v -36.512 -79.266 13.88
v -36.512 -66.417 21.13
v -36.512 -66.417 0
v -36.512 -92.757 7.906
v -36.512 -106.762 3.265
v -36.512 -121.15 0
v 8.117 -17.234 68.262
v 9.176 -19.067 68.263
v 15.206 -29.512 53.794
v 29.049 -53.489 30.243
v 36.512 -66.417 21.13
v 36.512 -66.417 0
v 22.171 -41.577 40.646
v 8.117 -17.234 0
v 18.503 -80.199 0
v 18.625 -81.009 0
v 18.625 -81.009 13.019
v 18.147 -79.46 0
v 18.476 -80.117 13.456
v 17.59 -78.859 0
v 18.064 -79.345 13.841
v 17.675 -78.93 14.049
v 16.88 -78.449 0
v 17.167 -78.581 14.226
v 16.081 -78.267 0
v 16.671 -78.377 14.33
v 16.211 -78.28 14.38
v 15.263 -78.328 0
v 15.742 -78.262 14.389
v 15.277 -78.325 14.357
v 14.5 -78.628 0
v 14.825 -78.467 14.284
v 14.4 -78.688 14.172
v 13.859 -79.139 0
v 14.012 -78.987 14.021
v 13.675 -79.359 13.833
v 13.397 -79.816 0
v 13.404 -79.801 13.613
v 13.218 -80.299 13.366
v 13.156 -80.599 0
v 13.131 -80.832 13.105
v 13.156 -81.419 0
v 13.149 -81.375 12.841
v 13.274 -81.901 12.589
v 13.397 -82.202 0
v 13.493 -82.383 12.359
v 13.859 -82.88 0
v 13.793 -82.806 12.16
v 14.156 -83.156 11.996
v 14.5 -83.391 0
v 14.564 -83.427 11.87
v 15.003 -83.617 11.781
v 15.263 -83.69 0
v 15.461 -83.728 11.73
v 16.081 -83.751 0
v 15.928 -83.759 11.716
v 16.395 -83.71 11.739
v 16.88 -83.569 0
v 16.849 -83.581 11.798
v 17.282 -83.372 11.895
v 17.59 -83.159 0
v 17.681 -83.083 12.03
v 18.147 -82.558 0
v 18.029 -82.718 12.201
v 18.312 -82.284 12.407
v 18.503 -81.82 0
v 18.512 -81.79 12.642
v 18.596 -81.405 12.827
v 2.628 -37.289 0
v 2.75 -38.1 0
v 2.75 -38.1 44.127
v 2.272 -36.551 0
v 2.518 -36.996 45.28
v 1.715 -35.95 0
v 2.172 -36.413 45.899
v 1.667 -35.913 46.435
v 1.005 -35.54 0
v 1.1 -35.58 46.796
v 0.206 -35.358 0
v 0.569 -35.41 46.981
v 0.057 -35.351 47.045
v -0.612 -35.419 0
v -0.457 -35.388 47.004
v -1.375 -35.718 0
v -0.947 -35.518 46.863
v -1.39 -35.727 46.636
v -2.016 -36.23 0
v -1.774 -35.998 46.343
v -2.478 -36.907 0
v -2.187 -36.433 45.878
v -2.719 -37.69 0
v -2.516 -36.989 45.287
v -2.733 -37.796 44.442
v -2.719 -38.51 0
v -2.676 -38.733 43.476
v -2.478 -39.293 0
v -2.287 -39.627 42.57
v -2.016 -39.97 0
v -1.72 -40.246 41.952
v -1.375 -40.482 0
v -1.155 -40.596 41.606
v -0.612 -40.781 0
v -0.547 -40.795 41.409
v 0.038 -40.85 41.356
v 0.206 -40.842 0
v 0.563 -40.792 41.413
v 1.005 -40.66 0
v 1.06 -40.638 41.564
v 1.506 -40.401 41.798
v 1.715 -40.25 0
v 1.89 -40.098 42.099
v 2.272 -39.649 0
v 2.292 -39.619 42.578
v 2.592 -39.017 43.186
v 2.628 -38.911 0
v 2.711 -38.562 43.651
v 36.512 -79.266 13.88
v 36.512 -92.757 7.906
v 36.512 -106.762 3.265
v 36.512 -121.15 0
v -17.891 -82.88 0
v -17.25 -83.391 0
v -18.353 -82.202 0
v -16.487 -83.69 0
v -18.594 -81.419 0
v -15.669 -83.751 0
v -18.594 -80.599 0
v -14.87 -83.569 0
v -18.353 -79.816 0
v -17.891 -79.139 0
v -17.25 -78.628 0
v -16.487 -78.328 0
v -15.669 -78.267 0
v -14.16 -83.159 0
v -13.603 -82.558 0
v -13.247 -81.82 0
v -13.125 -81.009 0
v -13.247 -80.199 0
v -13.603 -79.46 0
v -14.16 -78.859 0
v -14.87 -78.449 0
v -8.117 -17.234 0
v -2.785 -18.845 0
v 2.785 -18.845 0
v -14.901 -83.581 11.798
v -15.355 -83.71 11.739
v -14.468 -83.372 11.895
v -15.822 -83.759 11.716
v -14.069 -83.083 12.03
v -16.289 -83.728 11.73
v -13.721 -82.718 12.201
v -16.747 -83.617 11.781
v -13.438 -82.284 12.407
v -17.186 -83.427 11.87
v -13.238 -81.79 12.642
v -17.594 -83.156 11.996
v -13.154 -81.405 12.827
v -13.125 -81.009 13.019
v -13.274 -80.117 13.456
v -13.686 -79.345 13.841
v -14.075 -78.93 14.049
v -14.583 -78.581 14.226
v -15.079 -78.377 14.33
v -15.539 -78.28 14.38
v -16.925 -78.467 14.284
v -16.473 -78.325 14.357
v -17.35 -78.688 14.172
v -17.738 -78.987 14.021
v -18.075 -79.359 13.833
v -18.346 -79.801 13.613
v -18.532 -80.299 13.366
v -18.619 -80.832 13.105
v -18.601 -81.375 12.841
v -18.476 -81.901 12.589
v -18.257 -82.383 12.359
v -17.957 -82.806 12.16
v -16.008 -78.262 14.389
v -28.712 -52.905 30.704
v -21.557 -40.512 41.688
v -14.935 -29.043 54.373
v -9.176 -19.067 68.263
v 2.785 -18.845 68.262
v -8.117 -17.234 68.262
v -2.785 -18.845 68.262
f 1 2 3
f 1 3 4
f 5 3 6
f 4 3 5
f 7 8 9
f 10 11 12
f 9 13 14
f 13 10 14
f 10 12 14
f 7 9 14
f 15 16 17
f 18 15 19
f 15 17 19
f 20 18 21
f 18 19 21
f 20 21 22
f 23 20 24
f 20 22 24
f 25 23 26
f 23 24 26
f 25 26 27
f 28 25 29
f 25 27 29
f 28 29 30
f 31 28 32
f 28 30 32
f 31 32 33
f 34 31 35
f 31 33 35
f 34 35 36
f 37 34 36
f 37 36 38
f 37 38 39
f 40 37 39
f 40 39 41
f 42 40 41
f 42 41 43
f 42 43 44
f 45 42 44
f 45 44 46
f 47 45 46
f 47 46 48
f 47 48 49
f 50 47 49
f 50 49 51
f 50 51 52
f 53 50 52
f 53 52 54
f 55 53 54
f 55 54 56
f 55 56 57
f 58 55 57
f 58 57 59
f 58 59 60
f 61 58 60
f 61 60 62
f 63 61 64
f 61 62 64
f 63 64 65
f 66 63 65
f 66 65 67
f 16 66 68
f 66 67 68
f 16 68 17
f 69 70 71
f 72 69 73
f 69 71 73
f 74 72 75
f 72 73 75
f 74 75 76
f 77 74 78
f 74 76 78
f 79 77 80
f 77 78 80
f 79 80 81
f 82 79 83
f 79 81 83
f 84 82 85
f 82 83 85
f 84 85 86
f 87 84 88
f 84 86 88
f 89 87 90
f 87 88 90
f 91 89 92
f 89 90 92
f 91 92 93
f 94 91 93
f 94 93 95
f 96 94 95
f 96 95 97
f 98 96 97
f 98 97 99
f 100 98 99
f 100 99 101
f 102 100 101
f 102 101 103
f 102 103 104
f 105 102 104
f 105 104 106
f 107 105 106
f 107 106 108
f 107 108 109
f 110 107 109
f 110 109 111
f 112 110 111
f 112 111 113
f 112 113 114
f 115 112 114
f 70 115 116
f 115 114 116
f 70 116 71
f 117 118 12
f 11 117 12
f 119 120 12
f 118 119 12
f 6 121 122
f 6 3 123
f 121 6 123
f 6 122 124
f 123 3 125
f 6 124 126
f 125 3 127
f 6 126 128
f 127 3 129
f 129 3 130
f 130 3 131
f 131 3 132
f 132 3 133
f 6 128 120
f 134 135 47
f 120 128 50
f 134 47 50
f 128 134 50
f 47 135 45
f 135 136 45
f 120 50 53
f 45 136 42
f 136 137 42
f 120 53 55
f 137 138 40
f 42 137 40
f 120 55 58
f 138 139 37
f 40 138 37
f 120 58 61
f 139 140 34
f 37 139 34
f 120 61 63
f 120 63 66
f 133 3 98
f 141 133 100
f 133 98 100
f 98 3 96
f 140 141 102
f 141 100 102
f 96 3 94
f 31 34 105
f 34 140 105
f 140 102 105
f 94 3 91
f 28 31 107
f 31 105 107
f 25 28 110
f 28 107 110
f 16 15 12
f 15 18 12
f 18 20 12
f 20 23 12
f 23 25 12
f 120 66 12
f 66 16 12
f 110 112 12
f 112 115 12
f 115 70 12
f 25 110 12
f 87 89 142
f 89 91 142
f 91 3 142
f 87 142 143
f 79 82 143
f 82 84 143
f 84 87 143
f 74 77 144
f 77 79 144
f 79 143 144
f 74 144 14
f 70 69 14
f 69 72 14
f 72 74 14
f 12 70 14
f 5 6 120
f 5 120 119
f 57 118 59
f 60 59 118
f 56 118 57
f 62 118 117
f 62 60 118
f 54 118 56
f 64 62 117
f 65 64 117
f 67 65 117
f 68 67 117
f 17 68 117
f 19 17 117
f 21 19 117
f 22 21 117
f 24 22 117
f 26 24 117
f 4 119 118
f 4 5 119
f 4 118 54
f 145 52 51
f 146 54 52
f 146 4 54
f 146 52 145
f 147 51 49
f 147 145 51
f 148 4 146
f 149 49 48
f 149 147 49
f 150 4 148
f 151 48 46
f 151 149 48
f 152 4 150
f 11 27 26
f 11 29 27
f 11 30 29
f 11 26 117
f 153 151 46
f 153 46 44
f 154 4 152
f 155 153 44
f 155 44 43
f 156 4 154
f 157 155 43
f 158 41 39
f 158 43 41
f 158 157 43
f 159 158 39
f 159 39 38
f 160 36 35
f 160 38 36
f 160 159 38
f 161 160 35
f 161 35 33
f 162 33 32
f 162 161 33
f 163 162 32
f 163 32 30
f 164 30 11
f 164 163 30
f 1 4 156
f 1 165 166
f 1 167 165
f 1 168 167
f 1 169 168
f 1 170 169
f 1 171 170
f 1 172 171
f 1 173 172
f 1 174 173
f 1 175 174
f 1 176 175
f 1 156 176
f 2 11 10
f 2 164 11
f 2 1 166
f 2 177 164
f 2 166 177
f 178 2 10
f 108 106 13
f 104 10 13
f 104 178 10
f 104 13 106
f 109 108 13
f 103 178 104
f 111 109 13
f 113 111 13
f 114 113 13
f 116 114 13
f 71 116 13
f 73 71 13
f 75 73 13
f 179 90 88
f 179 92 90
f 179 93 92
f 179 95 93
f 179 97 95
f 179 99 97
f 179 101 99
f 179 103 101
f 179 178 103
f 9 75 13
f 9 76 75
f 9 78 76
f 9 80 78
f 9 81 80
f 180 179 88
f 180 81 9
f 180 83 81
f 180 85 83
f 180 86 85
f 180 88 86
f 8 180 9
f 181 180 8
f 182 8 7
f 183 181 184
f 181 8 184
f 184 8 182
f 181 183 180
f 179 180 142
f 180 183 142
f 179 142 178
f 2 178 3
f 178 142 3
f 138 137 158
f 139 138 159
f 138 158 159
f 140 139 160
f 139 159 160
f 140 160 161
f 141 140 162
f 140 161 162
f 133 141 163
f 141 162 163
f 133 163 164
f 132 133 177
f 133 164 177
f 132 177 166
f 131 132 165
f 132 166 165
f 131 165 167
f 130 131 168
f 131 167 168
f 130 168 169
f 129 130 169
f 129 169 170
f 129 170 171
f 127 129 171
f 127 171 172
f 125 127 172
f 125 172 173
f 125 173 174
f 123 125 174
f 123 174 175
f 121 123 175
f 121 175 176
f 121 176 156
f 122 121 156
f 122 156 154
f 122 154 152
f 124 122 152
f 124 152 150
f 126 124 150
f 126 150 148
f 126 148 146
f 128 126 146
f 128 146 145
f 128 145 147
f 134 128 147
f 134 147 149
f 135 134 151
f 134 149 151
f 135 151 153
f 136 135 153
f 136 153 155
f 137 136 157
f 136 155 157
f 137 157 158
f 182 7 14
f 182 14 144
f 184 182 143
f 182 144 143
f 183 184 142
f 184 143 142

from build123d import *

# Parameters (mm, degrees)
BOSS_EXTRUDE1_DEPTH  = 76.2
CUT_EXTRUDE1_START   = -36.5125
CUT_EXTRUDE1_DEPTH   = 73.025
M5_CLEARANCE_HOLE1_D = 5.5
CUT_EXTRUDE2_REACH   = 145.772
SKETCH10_R           = 19.05


with BuildPart() as part:
    # Sketch1 → Boss-Extrude1 (new body)
    with BuildSketch(Plane.XY):
        Polygon((36.5125, -121.15027858), (36.5125, -66.416505111), (0, -3.175), (-36.5125, -66.416505111), (-36.5125, -121.15027858), align=None)
    extrude(amount=BOSS_EXTRUDE1_DEPTH)

    # Sketch2 → Cut-Extrude1 (cut)
    with BuildSketch(Plane(origin=(0, 0, 0), x_dir=(0, 0, -1), z_dir=(1, 0, 0)).offset(CUT_EXTRUDE1_START)):
        with BuildLine():
            Line((-76.2, -121.15027858), (0, -121.15027858))
            ThreePointArc((0, -121.15027858), (-23.393988511, -62.928903921), (-68.2625, -19.067487592))
            Line((-68.2625, -19.067487592), (-68.2625, -3.175))
            Line((-68.2625, -3.175), (-76.2, -3.175))
            Line((-76.2, -3.175), (-76.2, -22.225))
            Line((-76.2, -22.225), (-76.2, -66.416505111))
            Line((-76.2, -66.416505111), (-76.2, -121.15027858))
        make_face()
    extrude(amount=CUT_EXTRUDE1_DEPTH, mode=Mode.SUBTRACT)

    # M5 Clearance Hole1 (through all)
    with Locations(Plane(origin=(0, 0, 0), x_dir=(-1, 0, 0), z_dir=(0, 0, -1))):
        with Locations((-15.875, -81.009177721), (15.875, -81.009177721), (0, -38.1)):
            Hole(M5_CLEARANCE_HOLE1_D / 2)

    # Sketch10 → Cut-Extrude2 (cut, up to next)
    with BuildSketch(Plane(origin=(0, 0, 0), x_dir=(-1, 0, 0), z_dir=(0, 0, -1)), mode=Mode.PRIVATE) as cut_extrude2_sk1:
        Circle(SKETCH10_R)
    cut_extrude2_tool1 = extrude(cut_extrude2_sk1.sketch, amount=-CUT_EXTRUDE2_REACH, mode=Mode.PRIVATE) & part.part
    add(cut_extrude2_tool1.solids().sort_by_distance((0, 0, 0))[0], mode=Mode.SUBTRACT)


solid = part.part
